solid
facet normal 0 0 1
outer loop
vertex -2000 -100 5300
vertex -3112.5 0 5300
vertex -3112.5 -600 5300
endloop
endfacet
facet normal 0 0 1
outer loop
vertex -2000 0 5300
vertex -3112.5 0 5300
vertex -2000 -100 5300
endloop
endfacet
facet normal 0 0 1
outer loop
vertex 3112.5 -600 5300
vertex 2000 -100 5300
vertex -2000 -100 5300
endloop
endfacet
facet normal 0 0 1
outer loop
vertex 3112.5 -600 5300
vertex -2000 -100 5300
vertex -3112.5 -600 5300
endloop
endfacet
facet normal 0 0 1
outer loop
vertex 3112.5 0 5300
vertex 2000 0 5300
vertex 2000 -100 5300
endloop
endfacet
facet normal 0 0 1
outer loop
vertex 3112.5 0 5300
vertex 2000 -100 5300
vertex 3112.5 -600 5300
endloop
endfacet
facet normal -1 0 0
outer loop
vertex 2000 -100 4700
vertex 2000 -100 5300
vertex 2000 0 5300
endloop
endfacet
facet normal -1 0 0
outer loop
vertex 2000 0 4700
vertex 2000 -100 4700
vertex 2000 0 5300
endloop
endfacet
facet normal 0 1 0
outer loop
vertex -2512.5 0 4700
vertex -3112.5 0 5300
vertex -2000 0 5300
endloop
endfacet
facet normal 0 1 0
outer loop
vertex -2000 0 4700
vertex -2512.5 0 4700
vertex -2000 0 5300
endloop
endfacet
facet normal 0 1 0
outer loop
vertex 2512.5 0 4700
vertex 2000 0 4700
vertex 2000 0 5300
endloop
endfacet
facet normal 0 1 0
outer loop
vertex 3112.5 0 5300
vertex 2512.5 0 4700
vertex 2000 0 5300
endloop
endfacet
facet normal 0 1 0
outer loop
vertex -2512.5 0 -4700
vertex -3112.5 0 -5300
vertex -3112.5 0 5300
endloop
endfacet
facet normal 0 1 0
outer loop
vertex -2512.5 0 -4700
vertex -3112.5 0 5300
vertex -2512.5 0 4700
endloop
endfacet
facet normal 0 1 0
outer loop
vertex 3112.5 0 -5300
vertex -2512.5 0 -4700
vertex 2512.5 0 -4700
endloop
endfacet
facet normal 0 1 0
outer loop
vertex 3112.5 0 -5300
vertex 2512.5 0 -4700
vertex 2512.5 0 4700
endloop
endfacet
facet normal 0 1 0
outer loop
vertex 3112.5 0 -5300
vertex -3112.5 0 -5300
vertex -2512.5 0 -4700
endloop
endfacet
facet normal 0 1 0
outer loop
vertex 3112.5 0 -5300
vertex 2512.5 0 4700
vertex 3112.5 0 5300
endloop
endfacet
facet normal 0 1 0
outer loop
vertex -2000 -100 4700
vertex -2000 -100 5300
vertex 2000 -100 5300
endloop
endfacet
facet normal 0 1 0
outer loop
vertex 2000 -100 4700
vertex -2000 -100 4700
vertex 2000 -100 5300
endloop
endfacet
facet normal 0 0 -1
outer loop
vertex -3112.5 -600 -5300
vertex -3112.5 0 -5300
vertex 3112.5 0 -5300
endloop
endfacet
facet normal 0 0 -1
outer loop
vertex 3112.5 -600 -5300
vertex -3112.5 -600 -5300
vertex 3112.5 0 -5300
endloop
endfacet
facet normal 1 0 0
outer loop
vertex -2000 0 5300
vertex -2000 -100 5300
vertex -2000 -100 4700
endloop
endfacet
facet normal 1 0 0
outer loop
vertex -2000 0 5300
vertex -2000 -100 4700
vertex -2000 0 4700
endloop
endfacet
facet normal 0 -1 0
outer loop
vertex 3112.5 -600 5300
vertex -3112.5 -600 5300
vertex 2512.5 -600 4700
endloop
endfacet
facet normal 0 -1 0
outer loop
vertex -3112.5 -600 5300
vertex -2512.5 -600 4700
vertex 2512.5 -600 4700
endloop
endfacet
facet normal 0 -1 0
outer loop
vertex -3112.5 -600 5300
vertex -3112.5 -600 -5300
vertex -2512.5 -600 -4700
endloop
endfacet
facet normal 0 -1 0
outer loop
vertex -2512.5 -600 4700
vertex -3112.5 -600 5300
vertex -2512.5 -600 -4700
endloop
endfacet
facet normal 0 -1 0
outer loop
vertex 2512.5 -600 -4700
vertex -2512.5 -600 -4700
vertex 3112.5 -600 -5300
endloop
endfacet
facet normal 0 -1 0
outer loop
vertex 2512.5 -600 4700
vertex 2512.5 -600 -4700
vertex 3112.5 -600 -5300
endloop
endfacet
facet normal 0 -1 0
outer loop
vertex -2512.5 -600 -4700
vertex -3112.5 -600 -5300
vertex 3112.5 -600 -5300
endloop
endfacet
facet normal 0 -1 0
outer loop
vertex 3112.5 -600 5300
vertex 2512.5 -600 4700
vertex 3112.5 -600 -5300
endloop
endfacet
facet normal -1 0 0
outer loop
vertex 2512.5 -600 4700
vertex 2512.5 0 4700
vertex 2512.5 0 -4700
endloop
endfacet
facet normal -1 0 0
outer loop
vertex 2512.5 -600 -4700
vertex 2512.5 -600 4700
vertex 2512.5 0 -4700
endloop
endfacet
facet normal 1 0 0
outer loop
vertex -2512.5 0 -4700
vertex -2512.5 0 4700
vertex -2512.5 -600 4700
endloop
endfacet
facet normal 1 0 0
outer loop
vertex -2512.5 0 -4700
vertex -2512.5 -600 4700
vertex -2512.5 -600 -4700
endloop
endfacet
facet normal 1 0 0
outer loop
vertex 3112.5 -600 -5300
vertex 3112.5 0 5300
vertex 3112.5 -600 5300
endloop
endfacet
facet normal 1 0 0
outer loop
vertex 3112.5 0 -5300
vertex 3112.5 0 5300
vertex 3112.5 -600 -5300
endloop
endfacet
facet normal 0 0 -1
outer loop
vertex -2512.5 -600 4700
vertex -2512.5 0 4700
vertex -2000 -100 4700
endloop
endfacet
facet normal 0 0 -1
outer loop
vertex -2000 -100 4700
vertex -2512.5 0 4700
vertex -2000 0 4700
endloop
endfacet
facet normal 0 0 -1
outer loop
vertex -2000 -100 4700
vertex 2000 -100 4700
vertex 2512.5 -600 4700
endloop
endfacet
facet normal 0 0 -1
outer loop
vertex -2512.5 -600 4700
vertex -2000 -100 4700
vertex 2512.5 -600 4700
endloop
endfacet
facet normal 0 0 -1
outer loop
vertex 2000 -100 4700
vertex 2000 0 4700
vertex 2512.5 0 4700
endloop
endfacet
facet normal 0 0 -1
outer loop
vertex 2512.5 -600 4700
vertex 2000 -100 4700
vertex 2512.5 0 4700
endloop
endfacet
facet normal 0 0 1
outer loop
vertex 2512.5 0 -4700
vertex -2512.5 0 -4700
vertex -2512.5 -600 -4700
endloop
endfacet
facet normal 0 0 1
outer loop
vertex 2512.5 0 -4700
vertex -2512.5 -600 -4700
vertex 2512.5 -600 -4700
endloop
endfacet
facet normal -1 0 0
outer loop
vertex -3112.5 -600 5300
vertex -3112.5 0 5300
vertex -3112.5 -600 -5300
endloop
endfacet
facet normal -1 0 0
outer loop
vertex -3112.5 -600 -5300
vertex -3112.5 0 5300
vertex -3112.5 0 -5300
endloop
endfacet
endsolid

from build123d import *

# Parameters (mm, degrees)
SKETCH_1_W          = 6225
SKETCH_1_H          = 10600
SKETCH_1_W_2        = 5025
SKETCH_1_H_2        = 9400
EXTRUDE_1_DEPTH     = 600
SKETCH_2_W          = 4000
SKETCH_2_H          = 100
CUT_EXTRUDE_2_DEPTH = 600


with BuildPart() as part:
    # Эскиз1 → Бобышка-Вытянуть1 (new body)
    with BuildSketch(Plane(origin=(0, 0, 0), x_dir=(1, 0, 0), z_dir=(0, 1, 0))):
        Rectangle(SKETCH_1_W, SKETCH_1_H)
        Rectangle(SKETCH_1_W_2, SKETCH_1_H_2, mode=Mode.SUBTRACT)
    extrude(amount=-EXTRUDE_1_DEPTH)

    # Эскиз2 → Вырез-Вытянуть2 (cut)
    with BuildSketch(Plane.XY.offset(5300)):
        with Locations((0, -50)):
            Rectangle(SKETCH_2_W, SKETCH_2_H)
    extrude(amount=-CUT_EXTRUDE_2_DEPTH, mode=Mode.SUBTRACT)


solid = part.part
